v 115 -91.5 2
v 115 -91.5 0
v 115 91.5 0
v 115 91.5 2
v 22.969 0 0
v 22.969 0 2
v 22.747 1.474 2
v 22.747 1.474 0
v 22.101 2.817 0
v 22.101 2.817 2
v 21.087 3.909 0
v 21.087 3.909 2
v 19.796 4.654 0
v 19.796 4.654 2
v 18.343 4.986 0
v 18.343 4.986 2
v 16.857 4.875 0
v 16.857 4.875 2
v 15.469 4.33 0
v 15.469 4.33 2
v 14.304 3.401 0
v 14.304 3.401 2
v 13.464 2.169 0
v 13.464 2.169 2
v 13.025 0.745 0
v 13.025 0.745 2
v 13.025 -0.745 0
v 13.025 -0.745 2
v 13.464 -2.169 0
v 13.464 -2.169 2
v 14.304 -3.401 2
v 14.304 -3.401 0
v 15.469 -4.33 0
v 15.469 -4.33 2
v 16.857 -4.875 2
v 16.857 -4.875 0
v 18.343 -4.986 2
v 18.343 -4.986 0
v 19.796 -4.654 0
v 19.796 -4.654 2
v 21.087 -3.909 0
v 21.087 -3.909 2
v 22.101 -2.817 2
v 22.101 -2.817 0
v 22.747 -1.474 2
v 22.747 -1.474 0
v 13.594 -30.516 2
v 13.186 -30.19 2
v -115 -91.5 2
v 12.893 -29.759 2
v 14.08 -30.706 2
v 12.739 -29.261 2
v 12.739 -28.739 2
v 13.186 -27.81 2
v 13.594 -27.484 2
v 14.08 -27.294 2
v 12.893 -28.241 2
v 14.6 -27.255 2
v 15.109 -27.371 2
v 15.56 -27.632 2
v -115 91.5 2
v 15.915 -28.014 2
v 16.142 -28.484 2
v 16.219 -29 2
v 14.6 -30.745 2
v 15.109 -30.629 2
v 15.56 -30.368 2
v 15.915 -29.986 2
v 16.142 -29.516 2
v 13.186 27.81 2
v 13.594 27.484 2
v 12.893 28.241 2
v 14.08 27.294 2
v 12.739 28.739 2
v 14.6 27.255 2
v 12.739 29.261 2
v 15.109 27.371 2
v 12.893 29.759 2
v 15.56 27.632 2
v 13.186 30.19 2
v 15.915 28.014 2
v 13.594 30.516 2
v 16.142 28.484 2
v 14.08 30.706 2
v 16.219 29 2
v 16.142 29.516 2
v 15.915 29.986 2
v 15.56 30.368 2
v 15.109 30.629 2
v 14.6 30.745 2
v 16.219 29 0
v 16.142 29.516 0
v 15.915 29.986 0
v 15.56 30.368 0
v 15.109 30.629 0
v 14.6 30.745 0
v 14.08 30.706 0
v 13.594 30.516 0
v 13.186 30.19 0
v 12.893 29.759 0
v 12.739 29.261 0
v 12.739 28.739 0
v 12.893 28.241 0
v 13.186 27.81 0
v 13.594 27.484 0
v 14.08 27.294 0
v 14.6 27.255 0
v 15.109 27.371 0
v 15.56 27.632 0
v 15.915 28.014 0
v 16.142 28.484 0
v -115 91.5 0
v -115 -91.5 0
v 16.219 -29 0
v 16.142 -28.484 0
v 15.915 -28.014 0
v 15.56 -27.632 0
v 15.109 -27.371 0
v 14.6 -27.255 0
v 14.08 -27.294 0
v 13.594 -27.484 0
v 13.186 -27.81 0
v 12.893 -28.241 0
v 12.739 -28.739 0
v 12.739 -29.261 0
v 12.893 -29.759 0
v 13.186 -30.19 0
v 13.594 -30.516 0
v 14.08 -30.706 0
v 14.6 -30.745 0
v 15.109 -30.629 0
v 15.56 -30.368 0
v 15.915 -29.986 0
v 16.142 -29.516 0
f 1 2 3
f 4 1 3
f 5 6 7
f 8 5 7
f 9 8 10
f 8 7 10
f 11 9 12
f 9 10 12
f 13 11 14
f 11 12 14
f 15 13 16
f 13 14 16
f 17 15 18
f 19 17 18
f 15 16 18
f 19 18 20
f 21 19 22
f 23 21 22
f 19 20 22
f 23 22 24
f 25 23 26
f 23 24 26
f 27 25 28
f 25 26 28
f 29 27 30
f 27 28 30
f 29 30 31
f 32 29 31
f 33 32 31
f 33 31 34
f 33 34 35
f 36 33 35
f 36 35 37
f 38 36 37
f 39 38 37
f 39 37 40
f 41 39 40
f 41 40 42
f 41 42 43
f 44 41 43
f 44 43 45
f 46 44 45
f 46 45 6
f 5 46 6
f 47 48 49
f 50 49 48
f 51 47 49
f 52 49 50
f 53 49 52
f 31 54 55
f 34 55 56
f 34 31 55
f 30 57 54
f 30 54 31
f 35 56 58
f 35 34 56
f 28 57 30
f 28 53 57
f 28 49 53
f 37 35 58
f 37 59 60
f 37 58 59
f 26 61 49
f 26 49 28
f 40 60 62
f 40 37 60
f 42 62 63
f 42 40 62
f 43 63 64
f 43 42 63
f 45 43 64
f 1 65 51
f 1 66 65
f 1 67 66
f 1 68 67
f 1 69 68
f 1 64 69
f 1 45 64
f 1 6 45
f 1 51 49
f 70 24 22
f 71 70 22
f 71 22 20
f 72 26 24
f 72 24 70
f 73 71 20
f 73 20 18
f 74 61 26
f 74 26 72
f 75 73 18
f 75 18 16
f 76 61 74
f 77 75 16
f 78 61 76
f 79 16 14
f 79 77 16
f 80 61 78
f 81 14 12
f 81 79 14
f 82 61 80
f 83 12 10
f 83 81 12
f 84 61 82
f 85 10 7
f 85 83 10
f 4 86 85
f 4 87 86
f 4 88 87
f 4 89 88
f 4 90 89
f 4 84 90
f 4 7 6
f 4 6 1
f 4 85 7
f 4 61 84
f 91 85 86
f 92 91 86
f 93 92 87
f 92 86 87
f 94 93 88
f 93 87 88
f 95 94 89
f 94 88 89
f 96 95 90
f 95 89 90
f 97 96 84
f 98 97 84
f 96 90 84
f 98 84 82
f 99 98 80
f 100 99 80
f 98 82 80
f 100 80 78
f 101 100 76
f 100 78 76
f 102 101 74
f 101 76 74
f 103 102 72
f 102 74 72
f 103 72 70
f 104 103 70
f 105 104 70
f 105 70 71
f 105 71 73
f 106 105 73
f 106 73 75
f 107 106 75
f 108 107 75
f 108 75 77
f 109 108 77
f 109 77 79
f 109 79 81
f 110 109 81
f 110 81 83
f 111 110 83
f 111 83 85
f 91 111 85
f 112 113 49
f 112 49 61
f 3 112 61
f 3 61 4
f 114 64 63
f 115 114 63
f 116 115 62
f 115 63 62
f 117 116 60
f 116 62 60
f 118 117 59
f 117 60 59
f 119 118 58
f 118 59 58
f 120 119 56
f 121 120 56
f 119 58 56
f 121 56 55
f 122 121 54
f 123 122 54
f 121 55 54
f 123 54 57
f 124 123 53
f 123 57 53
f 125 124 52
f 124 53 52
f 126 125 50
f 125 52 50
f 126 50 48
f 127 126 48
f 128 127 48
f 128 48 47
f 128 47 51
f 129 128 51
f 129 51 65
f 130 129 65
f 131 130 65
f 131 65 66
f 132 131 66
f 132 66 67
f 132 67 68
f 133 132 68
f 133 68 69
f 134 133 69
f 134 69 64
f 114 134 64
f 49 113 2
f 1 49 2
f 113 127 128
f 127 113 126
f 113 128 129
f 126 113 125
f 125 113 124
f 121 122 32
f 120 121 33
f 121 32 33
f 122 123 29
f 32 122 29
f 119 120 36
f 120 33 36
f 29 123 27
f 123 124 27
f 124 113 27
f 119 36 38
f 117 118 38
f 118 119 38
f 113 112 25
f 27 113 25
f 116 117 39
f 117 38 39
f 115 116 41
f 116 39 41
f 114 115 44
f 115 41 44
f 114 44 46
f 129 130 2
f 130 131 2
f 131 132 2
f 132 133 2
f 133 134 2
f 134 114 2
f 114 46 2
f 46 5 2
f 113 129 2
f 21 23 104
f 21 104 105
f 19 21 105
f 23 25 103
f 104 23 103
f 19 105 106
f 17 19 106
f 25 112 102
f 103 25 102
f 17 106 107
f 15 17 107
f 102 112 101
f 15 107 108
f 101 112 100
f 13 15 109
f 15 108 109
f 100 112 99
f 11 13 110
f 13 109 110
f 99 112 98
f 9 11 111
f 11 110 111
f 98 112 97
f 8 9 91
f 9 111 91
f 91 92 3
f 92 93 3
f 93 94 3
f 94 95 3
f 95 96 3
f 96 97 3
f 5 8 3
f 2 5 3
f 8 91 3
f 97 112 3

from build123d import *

# Parameters (mm, degrees)
F0_W     = 230
F0_H     = 183
F1_DEPTH = 2
F2_R     = 5
F3_DEPTH = 2.001
F4_R     = 1.75
F5_DEPTH = 2.001


with BuildPart() as f1:
    # F0 (on Top) → F1 (new body)
    with BuildSketch(Plane.XY):
        Rectangle(F0_W, F0_H)
    extrude(amount=F1_DEPTH)

    # F2 (on face) → F3 (cut, through all)
    with BuildSketch(Plane.XY.offset(2)):
        with Locations((17.969329, 0)):
            Circle(F2_R)
    extrude(amount=-F3_DEPTH, mode=Mode.SUBTRACT)

    # F4 (on face) → F5 (cut, through all)
    with BuildSketch(Plane.XY.offset(2)):
        with Locations((14.469329, 29)):
            Circle(F4_R)
        with Locations((14.469329, -29)):
            Circle(F4_R)
    extrude(amount=-F5_DEPTH, mode=Mode.SUBTRACT)


solid = f1.part
